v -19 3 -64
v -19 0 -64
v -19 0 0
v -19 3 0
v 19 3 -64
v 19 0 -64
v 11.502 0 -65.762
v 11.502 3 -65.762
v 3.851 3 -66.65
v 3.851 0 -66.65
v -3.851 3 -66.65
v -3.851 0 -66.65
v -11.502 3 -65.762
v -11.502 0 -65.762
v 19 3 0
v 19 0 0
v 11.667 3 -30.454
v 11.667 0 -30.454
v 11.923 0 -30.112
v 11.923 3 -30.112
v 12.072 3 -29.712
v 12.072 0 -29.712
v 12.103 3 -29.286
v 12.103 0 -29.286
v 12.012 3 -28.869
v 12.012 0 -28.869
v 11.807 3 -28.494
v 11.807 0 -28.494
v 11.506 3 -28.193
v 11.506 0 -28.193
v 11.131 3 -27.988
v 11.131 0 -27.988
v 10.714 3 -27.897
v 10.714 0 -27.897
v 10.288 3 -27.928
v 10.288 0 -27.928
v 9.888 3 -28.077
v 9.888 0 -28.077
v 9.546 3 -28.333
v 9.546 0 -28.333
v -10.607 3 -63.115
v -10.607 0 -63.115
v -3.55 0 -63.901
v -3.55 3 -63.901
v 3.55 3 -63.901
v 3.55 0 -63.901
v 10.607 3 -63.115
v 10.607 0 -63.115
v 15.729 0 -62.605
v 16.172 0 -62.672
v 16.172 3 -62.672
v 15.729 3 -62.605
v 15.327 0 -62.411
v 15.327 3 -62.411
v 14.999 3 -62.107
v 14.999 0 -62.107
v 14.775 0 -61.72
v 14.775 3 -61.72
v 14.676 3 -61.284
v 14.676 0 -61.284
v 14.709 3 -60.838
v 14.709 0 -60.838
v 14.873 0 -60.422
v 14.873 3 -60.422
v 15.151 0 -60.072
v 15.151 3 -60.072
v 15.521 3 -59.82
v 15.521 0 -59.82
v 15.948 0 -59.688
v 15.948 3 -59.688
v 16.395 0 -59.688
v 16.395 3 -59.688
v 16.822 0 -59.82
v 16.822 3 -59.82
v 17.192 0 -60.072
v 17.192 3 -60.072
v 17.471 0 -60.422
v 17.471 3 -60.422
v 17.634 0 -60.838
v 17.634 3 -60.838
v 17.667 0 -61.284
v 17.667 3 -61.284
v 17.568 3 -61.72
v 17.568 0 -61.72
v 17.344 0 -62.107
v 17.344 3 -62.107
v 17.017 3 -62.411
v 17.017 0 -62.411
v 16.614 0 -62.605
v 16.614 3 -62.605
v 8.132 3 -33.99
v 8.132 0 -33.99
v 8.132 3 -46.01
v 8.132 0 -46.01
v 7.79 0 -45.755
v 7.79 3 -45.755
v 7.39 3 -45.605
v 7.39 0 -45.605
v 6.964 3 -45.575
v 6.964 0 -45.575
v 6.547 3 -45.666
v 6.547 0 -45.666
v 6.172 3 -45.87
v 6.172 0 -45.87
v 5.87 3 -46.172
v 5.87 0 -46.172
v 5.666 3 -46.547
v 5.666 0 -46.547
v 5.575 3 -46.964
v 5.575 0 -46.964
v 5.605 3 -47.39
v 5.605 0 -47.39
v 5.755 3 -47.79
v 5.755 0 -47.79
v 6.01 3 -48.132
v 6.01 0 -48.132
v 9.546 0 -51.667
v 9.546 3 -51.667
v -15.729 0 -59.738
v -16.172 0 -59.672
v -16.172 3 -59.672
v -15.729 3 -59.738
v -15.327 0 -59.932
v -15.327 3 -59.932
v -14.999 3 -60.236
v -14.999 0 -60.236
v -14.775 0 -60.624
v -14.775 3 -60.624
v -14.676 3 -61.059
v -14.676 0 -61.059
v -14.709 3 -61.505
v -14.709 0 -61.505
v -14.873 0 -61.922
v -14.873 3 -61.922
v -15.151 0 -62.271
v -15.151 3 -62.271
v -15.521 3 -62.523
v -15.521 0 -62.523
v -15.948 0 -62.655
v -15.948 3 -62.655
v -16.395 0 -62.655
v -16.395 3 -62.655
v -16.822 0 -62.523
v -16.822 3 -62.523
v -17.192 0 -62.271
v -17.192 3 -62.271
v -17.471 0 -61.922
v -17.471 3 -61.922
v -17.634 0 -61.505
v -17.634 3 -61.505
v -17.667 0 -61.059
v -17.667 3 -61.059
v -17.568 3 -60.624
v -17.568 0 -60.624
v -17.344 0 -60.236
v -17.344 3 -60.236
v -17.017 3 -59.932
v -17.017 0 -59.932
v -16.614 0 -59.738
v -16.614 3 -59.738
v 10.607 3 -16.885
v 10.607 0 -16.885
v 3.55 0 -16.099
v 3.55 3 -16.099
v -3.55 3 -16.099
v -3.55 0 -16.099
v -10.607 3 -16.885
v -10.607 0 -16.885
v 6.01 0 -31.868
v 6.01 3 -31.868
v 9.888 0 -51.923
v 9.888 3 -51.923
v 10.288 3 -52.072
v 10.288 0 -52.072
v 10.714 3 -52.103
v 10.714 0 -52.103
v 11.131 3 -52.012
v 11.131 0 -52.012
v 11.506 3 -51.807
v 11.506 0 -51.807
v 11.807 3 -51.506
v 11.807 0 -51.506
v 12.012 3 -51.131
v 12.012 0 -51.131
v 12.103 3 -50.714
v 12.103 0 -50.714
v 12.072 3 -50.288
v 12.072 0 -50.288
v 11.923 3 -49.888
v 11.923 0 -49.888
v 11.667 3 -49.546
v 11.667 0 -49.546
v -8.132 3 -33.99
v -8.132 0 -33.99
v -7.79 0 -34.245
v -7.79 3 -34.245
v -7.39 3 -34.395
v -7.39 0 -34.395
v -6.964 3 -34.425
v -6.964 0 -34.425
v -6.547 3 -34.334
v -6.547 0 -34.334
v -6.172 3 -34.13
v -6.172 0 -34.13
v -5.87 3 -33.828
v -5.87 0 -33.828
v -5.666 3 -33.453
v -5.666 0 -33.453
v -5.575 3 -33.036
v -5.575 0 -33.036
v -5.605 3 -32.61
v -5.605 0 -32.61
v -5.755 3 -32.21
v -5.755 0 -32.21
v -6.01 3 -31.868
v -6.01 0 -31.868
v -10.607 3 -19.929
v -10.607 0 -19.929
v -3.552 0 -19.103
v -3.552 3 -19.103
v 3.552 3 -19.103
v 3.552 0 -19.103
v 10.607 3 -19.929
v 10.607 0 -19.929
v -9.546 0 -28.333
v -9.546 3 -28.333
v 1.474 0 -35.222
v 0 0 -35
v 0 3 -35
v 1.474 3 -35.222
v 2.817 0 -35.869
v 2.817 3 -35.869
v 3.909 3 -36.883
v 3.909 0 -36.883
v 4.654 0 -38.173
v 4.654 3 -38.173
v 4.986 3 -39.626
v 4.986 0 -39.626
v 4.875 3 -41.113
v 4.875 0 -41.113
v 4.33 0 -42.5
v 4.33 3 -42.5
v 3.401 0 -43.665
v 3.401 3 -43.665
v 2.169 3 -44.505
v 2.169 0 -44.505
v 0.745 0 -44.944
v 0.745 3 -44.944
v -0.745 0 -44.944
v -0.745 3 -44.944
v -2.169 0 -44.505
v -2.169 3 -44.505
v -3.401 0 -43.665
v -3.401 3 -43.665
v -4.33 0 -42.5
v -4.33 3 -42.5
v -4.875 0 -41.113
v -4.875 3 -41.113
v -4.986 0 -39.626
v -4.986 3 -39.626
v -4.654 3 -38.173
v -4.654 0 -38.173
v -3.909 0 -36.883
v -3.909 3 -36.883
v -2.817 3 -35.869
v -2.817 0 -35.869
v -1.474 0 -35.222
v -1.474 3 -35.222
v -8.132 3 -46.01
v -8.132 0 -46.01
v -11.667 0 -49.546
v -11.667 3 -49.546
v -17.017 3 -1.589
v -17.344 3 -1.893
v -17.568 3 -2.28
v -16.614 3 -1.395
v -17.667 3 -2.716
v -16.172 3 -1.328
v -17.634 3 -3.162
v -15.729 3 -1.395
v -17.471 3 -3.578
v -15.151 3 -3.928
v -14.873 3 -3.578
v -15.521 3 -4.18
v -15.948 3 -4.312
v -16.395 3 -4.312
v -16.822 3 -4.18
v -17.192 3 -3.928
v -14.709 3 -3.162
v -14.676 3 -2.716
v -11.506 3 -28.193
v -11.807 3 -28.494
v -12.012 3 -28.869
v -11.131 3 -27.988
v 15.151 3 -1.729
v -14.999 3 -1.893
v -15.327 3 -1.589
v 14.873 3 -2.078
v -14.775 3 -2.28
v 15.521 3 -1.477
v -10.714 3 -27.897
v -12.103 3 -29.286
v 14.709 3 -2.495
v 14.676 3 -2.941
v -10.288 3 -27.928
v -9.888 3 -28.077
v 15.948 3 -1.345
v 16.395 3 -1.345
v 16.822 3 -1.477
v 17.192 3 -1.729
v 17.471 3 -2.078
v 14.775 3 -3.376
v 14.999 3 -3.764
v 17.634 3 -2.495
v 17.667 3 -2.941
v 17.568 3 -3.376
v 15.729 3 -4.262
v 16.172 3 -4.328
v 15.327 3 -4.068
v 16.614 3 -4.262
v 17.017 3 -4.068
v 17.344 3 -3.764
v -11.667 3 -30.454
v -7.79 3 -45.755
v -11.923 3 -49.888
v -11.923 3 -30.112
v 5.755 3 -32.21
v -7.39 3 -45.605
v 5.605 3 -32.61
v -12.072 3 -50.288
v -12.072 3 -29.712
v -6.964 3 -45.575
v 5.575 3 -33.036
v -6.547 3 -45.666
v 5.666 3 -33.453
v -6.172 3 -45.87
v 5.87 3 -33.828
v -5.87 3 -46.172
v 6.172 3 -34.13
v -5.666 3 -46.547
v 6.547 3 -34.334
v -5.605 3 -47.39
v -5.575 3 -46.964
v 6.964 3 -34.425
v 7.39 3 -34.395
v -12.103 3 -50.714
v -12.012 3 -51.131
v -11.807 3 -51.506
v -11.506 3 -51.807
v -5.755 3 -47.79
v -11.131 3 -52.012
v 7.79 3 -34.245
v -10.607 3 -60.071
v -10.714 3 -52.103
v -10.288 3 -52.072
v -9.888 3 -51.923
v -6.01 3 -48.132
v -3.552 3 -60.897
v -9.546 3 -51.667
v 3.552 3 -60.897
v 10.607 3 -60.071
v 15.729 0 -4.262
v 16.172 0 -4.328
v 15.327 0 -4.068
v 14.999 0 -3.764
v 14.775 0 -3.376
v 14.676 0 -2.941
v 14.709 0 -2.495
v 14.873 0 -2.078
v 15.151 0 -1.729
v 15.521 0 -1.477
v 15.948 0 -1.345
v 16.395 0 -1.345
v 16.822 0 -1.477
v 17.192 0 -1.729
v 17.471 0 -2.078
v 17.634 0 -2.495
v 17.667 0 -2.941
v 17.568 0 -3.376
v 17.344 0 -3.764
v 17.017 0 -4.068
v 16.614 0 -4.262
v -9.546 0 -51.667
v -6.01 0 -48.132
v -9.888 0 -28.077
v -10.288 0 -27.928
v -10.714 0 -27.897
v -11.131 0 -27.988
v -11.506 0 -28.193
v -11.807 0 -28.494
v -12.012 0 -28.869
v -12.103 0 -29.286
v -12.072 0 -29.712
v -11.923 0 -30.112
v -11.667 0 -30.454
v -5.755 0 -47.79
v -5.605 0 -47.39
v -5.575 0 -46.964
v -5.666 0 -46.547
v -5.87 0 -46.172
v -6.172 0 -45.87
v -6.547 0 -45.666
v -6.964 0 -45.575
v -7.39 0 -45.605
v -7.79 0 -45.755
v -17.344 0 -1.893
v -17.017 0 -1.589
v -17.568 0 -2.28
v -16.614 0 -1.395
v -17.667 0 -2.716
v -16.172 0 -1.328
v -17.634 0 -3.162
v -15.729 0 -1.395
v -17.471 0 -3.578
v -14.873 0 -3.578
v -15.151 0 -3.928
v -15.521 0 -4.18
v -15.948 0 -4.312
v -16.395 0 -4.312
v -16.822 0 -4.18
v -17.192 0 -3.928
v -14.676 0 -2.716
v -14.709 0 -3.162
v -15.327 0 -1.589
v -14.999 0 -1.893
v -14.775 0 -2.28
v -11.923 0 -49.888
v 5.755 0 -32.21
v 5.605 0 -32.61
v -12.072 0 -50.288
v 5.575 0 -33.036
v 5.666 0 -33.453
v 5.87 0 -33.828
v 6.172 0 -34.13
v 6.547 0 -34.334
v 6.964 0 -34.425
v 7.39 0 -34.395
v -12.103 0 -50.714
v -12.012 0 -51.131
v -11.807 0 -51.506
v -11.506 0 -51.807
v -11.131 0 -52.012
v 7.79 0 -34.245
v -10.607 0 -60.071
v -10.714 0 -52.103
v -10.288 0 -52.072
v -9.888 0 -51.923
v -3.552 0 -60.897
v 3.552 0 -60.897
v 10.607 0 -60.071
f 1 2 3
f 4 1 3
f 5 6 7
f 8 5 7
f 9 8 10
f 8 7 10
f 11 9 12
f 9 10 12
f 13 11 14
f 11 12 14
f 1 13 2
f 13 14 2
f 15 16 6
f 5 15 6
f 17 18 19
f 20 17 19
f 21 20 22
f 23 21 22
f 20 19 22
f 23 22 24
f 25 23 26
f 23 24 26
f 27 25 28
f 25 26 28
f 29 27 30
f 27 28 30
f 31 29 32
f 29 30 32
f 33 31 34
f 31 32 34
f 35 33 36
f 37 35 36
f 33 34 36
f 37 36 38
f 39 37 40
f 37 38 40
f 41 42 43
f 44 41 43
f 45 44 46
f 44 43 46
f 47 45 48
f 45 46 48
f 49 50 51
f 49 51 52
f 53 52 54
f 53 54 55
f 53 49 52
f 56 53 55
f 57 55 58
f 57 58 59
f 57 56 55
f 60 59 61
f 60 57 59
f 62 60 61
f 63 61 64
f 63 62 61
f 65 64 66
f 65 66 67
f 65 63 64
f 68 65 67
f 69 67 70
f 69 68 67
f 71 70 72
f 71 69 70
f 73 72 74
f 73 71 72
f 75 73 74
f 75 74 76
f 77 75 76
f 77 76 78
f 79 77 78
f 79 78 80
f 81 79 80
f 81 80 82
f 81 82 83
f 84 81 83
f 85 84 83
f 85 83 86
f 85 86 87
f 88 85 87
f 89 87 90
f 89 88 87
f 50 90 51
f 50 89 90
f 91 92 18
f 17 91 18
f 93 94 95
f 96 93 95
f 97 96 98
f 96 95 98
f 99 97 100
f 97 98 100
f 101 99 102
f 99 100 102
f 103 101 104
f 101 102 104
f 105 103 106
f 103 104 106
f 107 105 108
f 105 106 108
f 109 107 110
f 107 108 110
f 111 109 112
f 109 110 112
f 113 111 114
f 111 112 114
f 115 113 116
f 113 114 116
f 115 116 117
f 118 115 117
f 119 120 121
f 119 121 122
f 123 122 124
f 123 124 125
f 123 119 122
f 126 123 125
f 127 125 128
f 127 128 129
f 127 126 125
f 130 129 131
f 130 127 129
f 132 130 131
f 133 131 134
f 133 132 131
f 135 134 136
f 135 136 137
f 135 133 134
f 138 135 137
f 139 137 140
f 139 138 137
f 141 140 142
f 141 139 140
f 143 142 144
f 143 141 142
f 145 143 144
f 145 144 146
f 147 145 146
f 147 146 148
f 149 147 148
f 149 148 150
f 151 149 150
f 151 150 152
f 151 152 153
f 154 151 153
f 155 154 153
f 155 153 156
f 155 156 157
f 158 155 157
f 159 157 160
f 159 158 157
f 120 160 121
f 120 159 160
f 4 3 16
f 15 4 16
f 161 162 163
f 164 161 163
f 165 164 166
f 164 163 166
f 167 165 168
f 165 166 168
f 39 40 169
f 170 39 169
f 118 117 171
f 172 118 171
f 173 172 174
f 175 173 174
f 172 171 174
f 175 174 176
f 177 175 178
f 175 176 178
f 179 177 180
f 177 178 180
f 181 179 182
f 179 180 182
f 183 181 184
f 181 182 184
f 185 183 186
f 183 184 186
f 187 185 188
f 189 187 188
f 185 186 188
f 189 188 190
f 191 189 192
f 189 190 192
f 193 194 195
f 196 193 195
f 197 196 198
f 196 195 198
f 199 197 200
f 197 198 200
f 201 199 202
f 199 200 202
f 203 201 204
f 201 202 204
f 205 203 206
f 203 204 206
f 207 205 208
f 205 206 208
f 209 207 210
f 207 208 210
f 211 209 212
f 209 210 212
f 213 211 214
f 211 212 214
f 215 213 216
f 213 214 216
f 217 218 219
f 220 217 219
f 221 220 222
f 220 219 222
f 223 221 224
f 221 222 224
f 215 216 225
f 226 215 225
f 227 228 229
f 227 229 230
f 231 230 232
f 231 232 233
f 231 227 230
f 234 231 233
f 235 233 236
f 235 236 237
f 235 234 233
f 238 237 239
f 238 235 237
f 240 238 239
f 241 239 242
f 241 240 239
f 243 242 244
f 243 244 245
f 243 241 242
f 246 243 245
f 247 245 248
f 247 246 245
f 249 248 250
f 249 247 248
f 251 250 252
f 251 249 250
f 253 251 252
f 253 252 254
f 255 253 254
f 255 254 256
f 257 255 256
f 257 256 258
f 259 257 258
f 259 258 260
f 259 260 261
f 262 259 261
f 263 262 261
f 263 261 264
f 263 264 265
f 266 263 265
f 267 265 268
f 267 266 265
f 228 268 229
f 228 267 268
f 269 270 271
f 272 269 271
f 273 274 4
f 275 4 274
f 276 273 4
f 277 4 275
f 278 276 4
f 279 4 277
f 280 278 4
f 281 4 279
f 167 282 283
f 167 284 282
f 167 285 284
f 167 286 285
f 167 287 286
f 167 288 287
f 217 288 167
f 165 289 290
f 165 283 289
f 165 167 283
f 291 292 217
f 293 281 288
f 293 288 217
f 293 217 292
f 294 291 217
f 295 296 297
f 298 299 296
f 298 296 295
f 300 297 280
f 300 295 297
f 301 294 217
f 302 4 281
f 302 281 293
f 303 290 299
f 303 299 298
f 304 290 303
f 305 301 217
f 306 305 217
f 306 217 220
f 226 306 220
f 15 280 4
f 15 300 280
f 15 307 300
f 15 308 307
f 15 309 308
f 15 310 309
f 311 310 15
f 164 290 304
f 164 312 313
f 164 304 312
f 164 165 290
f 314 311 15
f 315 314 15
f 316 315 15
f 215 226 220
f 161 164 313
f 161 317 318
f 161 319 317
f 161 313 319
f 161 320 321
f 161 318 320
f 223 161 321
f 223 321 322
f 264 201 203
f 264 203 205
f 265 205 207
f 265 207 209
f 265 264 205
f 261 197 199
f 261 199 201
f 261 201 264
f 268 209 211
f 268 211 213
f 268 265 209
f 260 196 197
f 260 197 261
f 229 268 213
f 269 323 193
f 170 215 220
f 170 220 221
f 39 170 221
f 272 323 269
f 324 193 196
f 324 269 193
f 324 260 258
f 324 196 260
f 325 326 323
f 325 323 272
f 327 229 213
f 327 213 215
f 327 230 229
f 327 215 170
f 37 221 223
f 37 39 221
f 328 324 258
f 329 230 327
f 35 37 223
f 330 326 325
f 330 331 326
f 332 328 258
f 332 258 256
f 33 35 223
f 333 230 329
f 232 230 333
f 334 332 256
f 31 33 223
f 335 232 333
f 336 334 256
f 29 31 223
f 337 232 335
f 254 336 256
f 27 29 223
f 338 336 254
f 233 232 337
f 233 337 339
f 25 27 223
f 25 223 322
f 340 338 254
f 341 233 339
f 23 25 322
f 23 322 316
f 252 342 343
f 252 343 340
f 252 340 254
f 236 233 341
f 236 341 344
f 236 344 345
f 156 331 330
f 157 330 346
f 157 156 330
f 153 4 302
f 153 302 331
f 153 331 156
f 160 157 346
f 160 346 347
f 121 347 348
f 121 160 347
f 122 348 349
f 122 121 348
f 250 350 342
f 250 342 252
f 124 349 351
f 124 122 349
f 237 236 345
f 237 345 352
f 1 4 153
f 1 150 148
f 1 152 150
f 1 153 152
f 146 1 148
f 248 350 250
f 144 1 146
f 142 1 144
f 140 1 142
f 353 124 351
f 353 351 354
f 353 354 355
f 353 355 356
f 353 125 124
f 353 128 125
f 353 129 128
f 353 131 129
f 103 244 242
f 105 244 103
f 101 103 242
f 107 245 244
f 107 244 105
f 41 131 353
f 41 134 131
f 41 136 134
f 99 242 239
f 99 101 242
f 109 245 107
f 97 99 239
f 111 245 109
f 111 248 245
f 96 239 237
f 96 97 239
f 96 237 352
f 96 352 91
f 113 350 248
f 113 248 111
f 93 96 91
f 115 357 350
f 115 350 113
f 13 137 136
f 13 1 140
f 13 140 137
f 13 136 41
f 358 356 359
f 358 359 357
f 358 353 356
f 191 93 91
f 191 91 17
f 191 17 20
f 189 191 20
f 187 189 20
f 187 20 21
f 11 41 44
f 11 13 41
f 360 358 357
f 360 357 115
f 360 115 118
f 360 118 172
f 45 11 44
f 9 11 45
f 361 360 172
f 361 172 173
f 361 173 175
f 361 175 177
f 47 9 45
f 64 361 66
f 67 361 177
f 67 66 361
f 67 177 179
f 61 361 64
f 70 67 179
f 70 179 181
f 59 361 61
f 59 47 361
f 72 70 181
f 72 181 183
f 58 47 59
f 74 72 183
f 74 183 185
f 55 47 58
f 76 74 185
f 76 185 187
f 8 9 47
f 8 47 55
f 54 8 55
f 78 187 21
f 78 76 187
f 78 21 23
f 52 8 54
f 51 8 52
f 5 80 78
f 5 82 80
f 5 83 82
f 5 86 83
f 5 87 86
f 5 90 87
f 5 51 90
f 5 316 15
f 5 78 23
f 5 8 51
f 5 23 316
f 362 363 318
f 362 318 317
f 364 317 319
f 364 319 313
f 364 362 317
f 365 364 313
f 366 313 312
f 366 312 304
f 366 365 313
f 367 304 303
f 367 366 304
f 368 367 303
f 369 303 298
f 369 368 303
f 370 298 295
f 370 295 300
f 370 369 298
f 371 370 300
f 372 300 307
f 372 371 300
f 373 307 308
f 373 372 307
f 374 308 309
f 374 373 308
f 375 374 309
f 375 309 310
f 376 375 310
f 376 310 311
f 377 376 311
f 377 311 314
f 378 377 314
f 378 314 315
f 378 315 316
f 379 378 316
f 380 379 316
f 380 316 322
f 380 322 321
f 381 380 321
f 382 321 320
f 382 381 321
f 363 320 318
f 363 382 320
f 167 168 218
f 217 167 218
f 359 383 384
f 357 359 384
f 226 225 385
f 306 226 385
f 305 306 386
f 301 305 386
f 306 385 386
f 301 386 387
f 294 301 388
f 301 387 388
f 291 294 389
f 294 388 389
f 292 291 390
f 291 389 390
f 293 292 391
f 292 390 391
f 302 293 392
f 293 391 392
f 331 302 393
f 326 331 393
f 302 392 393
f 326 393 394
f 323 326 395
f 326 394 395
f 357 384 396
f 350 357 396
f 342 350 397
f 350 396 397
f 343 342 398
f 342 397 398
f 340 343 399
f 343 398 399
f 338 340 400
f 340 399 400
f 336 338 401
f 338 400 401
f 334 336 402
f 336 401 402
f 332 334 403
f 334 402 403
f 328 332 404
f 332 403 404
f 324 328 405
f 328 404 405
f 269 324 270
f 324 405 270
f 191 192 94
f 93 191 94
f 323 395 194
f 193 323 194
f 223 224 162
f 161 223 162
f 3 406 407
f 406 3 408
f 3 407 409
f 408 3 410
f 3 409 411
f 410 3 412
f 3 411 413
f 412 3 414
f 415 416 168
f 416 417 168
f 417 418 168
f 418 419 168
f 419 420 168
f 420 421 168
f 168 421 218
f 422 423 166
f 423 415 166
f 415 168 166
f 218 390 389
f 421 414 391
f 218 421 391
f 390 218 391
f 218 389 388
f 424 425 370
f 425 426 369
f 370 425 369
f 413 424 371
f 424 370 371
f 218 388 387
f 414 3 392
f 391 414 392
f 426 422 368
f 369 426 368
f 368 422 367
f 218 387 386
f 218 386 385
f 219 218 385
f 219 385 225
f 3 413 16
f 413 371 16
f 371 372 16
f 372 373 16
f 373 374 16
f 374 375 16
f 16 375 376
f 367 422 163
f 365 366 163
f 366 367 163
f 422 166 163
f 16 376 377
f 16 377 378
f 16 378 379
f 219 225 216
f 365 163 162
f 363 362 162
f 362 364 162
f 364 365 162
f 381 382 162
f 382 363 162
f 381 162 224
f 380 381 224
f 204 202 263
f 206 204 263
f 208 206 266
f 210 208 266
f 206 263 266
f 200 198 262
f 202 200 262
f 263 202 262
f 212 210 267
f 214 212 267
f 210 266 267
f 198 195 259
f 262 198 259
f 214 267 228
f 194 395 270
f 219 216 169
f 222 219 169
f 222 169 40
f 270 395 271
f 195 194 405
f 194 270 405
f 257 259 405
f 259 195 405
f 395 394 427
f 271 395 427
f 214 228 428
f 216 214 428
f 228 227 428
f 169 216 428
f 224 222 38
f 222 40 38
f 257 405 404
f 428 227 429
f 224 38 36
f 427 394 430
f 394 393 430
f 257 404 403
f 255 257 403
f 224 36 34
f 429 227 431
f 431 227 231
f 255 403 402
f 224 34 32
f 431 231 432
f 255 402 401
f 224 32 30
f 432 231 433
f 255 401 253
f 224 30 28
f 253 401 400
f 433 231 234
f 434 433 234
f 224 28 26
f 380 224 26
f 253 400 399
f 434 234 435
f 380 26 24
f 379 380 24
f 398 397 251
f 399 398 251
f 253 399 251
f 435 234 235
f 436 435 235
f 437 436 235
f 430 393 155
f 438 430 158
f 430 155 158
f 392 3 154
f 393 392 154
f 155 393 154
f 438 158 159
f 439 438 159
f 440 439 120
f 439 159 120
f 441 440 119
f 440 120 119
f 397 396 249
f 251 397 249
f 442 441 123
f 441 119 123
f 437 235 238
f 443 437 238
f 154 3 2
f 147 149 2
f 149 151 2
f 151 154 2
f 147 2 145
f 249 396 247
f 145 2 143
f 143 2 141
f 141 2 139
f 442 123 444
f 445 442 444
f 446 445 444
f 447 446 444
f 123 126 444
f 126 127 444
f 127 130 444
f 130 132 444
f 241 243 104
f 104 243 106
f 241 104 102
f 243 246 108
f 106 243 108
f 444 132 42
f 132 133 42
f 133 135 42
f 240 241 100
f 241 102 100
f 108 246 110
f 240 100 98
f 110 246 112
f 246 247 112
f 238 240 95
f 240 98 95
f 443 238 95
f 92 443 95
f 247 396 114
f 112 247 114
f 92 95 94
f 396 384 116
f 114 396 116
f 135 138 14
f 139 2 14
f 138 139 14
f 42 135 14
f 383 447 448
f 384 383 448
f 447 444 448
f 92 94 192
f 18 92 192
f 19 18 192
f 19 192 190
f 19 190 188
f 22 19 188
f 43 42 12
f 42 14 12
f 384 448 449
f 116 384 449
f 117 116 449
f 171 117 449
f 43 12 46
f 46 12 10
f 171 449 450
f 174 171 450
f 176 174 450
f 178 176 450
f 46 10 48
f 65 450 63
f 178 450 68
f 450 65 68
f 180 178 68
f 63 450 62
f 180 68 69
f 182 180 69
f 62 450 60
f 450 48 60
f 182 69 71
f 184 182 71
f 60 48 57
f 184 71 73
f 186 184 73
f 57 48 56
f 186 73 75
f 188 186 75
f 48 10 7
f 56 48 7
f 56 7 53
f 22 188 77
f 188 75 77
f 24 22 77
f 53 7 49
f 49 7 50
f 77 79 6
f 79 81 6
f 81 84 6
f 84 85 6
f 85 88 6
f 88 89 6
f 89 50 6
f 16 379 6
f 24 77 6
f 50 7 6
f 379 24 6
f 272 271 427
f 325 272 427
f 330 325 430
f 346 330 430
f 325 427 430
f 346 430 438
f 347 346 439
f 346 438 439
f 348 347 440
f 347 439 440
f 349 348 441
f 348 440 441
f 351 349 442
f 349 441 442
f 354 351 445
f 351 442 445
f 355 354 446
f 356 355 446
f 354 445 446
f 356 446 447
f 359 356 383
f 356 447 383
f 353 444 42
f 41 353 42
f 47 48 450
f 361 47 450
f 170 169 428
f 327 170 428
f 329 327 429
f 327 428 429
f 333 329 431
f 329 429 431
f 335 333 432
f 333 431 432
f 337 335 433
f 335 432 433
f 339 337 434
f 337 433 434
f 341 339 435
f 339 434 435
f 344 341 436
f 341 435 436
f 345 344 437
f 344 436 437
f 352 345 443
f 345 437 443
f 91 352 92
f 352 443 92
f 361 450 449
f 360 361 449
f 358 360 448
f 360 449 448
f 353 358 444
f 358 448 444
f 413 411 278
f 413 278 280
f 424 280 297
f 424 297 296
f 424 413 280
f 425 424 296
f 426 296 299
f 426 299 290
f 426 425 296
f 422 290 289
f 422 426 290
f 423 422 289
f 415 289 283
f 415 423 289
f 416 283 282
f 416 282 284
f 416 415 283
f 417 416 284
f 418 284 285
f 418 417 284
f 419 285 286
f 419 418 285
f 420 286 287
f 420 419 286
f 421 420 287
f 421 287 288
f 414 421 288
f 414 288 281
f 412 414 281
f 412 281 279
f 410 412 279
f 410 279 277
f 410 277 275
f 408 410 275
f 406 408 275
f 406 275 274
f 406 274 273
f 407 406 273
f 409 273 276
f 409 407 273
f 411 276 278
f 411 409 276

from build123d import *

# Parameters (mm, degrees)
SKETCH_1_R      = 5
SKETCH_1_R_2    = 1.5
EXTRUDE_2_DEPTH = 3


with BuildPart() as part:
    # 草图1 → 凸台-拉伸2 (new body)
    with BuildSketch(Plane(origin=(0, 0, 0), x_dir=(1, 0, 0), z_dir=(0, 1, 0))):
        with BuildLine():
            Line((0, 0), (19, 0))
            Line((19, 0), (19, 64))
            ThreePointArc((19, 64), (0, 66.760766922), (-19, 64))
            Line((-19, 64), (-19, 0))
            Line((-19, 0), (0, 0))
        make_face()
        with Locations(Location((0, 40, 0), (0, 0, 270))):
            Circle(SKETCH_1_R, mode=Mode.SUBTRACT)
        with Locations(Location((-16.171572875, 2.828427125, 0), (0, 0, 270))):
            Circle(SKETCH_1_R_2, mode=Mode.SUBTRACT)
        with Locations(Location((-16.171572875, 61.171572875, 0), (0, 0, 270))):
            Circle(SKETCH_1_R_2, mode=Mode.SUBTRACT)
        with Locations(Location((16.171572875, 61.171572875, 0), (0, 0, 90))):
            Circle(SKETCH_1_R_2, mode=Mode.SUBTRACT)
        with Locations(Location((16.171572875, 2.828427125, 0), (0, 0, 90))):
            Circle(SKETCH_1_R_2, mode=Mode.SUBTRACT)
        with BuildLine():
            Line((10.606601718, 19.929208429), (10.606601718, 16.885025549))
            ThreePointArc((10.606601718, 16.885025549), (0, 16), (-10.606601718, 16.885025549))
            Line((-10.606601718, 16.885025549), (-10.606601718, 19.929208429))
            ThreePointArc((-10.606601718, 19.929208429), (0, 19), (10.606601718, 19.929208429))
        make_face(mode=Mode.SUBTRACT)
        with BuildLine():
            Line((-8.131727984, 46.01040764), (-11.66726189, 49.545941546))
            ThreePointArc((-11.66726189, 49.545941546), (-11.66726189, 51.66726189), (-9.545941546, 51.66726189))
            Line((-9.545941546, 51.66726189), (-6.01040764, 48.131727984))
            ThreePointArc((-6.01040764, 48.131727984), (-6.01040764, 46.01040764), (-8.131727984, 46.01040764))
        make_face(mode=Mode.SUBTRACT)
        with BuildLine():
            Line((6.01040764, 48.131727984), (9.545941546, 51.66726189))
            ThreePointArc((9.545941546, 51.66726189), (11.66726189, 51.66726189), (11.66726189, 49.545941546))
            Line((11.66726189, 49.545941546), (8.131727984, 46.01040764))
            ThreePointArc((8.131727984, 46.01040764), (6.01040764, 46.01040764), (6.01040764, 48.131727984))
        make_face(mode=Mode.SUBTRACT)
        with BuildLine():
            Line((8.131727984, 33.98959236), (11.66726189, 30.454058454))
            ThreePointArc((11.66726189, 30.454058454), (11.66726189, 28.33273811), (9.545941546, 28.33273811))
            Line((9.545941546, 28.33273811), (6.01040764, 31.868272016))
            ThreePointArc((6.01040764, 31.868272016), (6.01040764, 33.98959236), (8.131727984, 33.98959236))
        make_face(mode=Mode.SUBTRACT)
        with BuildLine():
            Line((-6.01040764, 31.868272016), (-9.545941546, 28.33273811))
            ThreePointArc((-9.545941546, 28.33273811), (-11.66726189, 28.33273811), (-11.66726189, 30.454058454))
            Line((-11.66726189, 30.454058454), (-8.131727984, 33.98959236))
            ThreePointArc((-8.131727984, 33.98959236), (-6.01040764, 33.98959236), (-6.01040764, 31.868272016))
        make_face(mode=Mode.SUBTRACT)
        with BuildLine():
            Line((-10.606601718, 60.070791571), (-10.606601718, 63.114974451))
            ThreePointArc((-10.606601718, 63.114974451), (0, 64), (10.606601718, 63.114974451))
            Line((10.606601718, 63.114974451), (10.606601718, 60.070791571))
            ThreePointArc((10.606601718, 60.070791571), (0, 61), (-10.606601718, 60.070791571))
        make_face(mode=Mode.SUBTRACT)
    extrude(amount=EXTRUDE_2_DEPTH)


solid = part.part
